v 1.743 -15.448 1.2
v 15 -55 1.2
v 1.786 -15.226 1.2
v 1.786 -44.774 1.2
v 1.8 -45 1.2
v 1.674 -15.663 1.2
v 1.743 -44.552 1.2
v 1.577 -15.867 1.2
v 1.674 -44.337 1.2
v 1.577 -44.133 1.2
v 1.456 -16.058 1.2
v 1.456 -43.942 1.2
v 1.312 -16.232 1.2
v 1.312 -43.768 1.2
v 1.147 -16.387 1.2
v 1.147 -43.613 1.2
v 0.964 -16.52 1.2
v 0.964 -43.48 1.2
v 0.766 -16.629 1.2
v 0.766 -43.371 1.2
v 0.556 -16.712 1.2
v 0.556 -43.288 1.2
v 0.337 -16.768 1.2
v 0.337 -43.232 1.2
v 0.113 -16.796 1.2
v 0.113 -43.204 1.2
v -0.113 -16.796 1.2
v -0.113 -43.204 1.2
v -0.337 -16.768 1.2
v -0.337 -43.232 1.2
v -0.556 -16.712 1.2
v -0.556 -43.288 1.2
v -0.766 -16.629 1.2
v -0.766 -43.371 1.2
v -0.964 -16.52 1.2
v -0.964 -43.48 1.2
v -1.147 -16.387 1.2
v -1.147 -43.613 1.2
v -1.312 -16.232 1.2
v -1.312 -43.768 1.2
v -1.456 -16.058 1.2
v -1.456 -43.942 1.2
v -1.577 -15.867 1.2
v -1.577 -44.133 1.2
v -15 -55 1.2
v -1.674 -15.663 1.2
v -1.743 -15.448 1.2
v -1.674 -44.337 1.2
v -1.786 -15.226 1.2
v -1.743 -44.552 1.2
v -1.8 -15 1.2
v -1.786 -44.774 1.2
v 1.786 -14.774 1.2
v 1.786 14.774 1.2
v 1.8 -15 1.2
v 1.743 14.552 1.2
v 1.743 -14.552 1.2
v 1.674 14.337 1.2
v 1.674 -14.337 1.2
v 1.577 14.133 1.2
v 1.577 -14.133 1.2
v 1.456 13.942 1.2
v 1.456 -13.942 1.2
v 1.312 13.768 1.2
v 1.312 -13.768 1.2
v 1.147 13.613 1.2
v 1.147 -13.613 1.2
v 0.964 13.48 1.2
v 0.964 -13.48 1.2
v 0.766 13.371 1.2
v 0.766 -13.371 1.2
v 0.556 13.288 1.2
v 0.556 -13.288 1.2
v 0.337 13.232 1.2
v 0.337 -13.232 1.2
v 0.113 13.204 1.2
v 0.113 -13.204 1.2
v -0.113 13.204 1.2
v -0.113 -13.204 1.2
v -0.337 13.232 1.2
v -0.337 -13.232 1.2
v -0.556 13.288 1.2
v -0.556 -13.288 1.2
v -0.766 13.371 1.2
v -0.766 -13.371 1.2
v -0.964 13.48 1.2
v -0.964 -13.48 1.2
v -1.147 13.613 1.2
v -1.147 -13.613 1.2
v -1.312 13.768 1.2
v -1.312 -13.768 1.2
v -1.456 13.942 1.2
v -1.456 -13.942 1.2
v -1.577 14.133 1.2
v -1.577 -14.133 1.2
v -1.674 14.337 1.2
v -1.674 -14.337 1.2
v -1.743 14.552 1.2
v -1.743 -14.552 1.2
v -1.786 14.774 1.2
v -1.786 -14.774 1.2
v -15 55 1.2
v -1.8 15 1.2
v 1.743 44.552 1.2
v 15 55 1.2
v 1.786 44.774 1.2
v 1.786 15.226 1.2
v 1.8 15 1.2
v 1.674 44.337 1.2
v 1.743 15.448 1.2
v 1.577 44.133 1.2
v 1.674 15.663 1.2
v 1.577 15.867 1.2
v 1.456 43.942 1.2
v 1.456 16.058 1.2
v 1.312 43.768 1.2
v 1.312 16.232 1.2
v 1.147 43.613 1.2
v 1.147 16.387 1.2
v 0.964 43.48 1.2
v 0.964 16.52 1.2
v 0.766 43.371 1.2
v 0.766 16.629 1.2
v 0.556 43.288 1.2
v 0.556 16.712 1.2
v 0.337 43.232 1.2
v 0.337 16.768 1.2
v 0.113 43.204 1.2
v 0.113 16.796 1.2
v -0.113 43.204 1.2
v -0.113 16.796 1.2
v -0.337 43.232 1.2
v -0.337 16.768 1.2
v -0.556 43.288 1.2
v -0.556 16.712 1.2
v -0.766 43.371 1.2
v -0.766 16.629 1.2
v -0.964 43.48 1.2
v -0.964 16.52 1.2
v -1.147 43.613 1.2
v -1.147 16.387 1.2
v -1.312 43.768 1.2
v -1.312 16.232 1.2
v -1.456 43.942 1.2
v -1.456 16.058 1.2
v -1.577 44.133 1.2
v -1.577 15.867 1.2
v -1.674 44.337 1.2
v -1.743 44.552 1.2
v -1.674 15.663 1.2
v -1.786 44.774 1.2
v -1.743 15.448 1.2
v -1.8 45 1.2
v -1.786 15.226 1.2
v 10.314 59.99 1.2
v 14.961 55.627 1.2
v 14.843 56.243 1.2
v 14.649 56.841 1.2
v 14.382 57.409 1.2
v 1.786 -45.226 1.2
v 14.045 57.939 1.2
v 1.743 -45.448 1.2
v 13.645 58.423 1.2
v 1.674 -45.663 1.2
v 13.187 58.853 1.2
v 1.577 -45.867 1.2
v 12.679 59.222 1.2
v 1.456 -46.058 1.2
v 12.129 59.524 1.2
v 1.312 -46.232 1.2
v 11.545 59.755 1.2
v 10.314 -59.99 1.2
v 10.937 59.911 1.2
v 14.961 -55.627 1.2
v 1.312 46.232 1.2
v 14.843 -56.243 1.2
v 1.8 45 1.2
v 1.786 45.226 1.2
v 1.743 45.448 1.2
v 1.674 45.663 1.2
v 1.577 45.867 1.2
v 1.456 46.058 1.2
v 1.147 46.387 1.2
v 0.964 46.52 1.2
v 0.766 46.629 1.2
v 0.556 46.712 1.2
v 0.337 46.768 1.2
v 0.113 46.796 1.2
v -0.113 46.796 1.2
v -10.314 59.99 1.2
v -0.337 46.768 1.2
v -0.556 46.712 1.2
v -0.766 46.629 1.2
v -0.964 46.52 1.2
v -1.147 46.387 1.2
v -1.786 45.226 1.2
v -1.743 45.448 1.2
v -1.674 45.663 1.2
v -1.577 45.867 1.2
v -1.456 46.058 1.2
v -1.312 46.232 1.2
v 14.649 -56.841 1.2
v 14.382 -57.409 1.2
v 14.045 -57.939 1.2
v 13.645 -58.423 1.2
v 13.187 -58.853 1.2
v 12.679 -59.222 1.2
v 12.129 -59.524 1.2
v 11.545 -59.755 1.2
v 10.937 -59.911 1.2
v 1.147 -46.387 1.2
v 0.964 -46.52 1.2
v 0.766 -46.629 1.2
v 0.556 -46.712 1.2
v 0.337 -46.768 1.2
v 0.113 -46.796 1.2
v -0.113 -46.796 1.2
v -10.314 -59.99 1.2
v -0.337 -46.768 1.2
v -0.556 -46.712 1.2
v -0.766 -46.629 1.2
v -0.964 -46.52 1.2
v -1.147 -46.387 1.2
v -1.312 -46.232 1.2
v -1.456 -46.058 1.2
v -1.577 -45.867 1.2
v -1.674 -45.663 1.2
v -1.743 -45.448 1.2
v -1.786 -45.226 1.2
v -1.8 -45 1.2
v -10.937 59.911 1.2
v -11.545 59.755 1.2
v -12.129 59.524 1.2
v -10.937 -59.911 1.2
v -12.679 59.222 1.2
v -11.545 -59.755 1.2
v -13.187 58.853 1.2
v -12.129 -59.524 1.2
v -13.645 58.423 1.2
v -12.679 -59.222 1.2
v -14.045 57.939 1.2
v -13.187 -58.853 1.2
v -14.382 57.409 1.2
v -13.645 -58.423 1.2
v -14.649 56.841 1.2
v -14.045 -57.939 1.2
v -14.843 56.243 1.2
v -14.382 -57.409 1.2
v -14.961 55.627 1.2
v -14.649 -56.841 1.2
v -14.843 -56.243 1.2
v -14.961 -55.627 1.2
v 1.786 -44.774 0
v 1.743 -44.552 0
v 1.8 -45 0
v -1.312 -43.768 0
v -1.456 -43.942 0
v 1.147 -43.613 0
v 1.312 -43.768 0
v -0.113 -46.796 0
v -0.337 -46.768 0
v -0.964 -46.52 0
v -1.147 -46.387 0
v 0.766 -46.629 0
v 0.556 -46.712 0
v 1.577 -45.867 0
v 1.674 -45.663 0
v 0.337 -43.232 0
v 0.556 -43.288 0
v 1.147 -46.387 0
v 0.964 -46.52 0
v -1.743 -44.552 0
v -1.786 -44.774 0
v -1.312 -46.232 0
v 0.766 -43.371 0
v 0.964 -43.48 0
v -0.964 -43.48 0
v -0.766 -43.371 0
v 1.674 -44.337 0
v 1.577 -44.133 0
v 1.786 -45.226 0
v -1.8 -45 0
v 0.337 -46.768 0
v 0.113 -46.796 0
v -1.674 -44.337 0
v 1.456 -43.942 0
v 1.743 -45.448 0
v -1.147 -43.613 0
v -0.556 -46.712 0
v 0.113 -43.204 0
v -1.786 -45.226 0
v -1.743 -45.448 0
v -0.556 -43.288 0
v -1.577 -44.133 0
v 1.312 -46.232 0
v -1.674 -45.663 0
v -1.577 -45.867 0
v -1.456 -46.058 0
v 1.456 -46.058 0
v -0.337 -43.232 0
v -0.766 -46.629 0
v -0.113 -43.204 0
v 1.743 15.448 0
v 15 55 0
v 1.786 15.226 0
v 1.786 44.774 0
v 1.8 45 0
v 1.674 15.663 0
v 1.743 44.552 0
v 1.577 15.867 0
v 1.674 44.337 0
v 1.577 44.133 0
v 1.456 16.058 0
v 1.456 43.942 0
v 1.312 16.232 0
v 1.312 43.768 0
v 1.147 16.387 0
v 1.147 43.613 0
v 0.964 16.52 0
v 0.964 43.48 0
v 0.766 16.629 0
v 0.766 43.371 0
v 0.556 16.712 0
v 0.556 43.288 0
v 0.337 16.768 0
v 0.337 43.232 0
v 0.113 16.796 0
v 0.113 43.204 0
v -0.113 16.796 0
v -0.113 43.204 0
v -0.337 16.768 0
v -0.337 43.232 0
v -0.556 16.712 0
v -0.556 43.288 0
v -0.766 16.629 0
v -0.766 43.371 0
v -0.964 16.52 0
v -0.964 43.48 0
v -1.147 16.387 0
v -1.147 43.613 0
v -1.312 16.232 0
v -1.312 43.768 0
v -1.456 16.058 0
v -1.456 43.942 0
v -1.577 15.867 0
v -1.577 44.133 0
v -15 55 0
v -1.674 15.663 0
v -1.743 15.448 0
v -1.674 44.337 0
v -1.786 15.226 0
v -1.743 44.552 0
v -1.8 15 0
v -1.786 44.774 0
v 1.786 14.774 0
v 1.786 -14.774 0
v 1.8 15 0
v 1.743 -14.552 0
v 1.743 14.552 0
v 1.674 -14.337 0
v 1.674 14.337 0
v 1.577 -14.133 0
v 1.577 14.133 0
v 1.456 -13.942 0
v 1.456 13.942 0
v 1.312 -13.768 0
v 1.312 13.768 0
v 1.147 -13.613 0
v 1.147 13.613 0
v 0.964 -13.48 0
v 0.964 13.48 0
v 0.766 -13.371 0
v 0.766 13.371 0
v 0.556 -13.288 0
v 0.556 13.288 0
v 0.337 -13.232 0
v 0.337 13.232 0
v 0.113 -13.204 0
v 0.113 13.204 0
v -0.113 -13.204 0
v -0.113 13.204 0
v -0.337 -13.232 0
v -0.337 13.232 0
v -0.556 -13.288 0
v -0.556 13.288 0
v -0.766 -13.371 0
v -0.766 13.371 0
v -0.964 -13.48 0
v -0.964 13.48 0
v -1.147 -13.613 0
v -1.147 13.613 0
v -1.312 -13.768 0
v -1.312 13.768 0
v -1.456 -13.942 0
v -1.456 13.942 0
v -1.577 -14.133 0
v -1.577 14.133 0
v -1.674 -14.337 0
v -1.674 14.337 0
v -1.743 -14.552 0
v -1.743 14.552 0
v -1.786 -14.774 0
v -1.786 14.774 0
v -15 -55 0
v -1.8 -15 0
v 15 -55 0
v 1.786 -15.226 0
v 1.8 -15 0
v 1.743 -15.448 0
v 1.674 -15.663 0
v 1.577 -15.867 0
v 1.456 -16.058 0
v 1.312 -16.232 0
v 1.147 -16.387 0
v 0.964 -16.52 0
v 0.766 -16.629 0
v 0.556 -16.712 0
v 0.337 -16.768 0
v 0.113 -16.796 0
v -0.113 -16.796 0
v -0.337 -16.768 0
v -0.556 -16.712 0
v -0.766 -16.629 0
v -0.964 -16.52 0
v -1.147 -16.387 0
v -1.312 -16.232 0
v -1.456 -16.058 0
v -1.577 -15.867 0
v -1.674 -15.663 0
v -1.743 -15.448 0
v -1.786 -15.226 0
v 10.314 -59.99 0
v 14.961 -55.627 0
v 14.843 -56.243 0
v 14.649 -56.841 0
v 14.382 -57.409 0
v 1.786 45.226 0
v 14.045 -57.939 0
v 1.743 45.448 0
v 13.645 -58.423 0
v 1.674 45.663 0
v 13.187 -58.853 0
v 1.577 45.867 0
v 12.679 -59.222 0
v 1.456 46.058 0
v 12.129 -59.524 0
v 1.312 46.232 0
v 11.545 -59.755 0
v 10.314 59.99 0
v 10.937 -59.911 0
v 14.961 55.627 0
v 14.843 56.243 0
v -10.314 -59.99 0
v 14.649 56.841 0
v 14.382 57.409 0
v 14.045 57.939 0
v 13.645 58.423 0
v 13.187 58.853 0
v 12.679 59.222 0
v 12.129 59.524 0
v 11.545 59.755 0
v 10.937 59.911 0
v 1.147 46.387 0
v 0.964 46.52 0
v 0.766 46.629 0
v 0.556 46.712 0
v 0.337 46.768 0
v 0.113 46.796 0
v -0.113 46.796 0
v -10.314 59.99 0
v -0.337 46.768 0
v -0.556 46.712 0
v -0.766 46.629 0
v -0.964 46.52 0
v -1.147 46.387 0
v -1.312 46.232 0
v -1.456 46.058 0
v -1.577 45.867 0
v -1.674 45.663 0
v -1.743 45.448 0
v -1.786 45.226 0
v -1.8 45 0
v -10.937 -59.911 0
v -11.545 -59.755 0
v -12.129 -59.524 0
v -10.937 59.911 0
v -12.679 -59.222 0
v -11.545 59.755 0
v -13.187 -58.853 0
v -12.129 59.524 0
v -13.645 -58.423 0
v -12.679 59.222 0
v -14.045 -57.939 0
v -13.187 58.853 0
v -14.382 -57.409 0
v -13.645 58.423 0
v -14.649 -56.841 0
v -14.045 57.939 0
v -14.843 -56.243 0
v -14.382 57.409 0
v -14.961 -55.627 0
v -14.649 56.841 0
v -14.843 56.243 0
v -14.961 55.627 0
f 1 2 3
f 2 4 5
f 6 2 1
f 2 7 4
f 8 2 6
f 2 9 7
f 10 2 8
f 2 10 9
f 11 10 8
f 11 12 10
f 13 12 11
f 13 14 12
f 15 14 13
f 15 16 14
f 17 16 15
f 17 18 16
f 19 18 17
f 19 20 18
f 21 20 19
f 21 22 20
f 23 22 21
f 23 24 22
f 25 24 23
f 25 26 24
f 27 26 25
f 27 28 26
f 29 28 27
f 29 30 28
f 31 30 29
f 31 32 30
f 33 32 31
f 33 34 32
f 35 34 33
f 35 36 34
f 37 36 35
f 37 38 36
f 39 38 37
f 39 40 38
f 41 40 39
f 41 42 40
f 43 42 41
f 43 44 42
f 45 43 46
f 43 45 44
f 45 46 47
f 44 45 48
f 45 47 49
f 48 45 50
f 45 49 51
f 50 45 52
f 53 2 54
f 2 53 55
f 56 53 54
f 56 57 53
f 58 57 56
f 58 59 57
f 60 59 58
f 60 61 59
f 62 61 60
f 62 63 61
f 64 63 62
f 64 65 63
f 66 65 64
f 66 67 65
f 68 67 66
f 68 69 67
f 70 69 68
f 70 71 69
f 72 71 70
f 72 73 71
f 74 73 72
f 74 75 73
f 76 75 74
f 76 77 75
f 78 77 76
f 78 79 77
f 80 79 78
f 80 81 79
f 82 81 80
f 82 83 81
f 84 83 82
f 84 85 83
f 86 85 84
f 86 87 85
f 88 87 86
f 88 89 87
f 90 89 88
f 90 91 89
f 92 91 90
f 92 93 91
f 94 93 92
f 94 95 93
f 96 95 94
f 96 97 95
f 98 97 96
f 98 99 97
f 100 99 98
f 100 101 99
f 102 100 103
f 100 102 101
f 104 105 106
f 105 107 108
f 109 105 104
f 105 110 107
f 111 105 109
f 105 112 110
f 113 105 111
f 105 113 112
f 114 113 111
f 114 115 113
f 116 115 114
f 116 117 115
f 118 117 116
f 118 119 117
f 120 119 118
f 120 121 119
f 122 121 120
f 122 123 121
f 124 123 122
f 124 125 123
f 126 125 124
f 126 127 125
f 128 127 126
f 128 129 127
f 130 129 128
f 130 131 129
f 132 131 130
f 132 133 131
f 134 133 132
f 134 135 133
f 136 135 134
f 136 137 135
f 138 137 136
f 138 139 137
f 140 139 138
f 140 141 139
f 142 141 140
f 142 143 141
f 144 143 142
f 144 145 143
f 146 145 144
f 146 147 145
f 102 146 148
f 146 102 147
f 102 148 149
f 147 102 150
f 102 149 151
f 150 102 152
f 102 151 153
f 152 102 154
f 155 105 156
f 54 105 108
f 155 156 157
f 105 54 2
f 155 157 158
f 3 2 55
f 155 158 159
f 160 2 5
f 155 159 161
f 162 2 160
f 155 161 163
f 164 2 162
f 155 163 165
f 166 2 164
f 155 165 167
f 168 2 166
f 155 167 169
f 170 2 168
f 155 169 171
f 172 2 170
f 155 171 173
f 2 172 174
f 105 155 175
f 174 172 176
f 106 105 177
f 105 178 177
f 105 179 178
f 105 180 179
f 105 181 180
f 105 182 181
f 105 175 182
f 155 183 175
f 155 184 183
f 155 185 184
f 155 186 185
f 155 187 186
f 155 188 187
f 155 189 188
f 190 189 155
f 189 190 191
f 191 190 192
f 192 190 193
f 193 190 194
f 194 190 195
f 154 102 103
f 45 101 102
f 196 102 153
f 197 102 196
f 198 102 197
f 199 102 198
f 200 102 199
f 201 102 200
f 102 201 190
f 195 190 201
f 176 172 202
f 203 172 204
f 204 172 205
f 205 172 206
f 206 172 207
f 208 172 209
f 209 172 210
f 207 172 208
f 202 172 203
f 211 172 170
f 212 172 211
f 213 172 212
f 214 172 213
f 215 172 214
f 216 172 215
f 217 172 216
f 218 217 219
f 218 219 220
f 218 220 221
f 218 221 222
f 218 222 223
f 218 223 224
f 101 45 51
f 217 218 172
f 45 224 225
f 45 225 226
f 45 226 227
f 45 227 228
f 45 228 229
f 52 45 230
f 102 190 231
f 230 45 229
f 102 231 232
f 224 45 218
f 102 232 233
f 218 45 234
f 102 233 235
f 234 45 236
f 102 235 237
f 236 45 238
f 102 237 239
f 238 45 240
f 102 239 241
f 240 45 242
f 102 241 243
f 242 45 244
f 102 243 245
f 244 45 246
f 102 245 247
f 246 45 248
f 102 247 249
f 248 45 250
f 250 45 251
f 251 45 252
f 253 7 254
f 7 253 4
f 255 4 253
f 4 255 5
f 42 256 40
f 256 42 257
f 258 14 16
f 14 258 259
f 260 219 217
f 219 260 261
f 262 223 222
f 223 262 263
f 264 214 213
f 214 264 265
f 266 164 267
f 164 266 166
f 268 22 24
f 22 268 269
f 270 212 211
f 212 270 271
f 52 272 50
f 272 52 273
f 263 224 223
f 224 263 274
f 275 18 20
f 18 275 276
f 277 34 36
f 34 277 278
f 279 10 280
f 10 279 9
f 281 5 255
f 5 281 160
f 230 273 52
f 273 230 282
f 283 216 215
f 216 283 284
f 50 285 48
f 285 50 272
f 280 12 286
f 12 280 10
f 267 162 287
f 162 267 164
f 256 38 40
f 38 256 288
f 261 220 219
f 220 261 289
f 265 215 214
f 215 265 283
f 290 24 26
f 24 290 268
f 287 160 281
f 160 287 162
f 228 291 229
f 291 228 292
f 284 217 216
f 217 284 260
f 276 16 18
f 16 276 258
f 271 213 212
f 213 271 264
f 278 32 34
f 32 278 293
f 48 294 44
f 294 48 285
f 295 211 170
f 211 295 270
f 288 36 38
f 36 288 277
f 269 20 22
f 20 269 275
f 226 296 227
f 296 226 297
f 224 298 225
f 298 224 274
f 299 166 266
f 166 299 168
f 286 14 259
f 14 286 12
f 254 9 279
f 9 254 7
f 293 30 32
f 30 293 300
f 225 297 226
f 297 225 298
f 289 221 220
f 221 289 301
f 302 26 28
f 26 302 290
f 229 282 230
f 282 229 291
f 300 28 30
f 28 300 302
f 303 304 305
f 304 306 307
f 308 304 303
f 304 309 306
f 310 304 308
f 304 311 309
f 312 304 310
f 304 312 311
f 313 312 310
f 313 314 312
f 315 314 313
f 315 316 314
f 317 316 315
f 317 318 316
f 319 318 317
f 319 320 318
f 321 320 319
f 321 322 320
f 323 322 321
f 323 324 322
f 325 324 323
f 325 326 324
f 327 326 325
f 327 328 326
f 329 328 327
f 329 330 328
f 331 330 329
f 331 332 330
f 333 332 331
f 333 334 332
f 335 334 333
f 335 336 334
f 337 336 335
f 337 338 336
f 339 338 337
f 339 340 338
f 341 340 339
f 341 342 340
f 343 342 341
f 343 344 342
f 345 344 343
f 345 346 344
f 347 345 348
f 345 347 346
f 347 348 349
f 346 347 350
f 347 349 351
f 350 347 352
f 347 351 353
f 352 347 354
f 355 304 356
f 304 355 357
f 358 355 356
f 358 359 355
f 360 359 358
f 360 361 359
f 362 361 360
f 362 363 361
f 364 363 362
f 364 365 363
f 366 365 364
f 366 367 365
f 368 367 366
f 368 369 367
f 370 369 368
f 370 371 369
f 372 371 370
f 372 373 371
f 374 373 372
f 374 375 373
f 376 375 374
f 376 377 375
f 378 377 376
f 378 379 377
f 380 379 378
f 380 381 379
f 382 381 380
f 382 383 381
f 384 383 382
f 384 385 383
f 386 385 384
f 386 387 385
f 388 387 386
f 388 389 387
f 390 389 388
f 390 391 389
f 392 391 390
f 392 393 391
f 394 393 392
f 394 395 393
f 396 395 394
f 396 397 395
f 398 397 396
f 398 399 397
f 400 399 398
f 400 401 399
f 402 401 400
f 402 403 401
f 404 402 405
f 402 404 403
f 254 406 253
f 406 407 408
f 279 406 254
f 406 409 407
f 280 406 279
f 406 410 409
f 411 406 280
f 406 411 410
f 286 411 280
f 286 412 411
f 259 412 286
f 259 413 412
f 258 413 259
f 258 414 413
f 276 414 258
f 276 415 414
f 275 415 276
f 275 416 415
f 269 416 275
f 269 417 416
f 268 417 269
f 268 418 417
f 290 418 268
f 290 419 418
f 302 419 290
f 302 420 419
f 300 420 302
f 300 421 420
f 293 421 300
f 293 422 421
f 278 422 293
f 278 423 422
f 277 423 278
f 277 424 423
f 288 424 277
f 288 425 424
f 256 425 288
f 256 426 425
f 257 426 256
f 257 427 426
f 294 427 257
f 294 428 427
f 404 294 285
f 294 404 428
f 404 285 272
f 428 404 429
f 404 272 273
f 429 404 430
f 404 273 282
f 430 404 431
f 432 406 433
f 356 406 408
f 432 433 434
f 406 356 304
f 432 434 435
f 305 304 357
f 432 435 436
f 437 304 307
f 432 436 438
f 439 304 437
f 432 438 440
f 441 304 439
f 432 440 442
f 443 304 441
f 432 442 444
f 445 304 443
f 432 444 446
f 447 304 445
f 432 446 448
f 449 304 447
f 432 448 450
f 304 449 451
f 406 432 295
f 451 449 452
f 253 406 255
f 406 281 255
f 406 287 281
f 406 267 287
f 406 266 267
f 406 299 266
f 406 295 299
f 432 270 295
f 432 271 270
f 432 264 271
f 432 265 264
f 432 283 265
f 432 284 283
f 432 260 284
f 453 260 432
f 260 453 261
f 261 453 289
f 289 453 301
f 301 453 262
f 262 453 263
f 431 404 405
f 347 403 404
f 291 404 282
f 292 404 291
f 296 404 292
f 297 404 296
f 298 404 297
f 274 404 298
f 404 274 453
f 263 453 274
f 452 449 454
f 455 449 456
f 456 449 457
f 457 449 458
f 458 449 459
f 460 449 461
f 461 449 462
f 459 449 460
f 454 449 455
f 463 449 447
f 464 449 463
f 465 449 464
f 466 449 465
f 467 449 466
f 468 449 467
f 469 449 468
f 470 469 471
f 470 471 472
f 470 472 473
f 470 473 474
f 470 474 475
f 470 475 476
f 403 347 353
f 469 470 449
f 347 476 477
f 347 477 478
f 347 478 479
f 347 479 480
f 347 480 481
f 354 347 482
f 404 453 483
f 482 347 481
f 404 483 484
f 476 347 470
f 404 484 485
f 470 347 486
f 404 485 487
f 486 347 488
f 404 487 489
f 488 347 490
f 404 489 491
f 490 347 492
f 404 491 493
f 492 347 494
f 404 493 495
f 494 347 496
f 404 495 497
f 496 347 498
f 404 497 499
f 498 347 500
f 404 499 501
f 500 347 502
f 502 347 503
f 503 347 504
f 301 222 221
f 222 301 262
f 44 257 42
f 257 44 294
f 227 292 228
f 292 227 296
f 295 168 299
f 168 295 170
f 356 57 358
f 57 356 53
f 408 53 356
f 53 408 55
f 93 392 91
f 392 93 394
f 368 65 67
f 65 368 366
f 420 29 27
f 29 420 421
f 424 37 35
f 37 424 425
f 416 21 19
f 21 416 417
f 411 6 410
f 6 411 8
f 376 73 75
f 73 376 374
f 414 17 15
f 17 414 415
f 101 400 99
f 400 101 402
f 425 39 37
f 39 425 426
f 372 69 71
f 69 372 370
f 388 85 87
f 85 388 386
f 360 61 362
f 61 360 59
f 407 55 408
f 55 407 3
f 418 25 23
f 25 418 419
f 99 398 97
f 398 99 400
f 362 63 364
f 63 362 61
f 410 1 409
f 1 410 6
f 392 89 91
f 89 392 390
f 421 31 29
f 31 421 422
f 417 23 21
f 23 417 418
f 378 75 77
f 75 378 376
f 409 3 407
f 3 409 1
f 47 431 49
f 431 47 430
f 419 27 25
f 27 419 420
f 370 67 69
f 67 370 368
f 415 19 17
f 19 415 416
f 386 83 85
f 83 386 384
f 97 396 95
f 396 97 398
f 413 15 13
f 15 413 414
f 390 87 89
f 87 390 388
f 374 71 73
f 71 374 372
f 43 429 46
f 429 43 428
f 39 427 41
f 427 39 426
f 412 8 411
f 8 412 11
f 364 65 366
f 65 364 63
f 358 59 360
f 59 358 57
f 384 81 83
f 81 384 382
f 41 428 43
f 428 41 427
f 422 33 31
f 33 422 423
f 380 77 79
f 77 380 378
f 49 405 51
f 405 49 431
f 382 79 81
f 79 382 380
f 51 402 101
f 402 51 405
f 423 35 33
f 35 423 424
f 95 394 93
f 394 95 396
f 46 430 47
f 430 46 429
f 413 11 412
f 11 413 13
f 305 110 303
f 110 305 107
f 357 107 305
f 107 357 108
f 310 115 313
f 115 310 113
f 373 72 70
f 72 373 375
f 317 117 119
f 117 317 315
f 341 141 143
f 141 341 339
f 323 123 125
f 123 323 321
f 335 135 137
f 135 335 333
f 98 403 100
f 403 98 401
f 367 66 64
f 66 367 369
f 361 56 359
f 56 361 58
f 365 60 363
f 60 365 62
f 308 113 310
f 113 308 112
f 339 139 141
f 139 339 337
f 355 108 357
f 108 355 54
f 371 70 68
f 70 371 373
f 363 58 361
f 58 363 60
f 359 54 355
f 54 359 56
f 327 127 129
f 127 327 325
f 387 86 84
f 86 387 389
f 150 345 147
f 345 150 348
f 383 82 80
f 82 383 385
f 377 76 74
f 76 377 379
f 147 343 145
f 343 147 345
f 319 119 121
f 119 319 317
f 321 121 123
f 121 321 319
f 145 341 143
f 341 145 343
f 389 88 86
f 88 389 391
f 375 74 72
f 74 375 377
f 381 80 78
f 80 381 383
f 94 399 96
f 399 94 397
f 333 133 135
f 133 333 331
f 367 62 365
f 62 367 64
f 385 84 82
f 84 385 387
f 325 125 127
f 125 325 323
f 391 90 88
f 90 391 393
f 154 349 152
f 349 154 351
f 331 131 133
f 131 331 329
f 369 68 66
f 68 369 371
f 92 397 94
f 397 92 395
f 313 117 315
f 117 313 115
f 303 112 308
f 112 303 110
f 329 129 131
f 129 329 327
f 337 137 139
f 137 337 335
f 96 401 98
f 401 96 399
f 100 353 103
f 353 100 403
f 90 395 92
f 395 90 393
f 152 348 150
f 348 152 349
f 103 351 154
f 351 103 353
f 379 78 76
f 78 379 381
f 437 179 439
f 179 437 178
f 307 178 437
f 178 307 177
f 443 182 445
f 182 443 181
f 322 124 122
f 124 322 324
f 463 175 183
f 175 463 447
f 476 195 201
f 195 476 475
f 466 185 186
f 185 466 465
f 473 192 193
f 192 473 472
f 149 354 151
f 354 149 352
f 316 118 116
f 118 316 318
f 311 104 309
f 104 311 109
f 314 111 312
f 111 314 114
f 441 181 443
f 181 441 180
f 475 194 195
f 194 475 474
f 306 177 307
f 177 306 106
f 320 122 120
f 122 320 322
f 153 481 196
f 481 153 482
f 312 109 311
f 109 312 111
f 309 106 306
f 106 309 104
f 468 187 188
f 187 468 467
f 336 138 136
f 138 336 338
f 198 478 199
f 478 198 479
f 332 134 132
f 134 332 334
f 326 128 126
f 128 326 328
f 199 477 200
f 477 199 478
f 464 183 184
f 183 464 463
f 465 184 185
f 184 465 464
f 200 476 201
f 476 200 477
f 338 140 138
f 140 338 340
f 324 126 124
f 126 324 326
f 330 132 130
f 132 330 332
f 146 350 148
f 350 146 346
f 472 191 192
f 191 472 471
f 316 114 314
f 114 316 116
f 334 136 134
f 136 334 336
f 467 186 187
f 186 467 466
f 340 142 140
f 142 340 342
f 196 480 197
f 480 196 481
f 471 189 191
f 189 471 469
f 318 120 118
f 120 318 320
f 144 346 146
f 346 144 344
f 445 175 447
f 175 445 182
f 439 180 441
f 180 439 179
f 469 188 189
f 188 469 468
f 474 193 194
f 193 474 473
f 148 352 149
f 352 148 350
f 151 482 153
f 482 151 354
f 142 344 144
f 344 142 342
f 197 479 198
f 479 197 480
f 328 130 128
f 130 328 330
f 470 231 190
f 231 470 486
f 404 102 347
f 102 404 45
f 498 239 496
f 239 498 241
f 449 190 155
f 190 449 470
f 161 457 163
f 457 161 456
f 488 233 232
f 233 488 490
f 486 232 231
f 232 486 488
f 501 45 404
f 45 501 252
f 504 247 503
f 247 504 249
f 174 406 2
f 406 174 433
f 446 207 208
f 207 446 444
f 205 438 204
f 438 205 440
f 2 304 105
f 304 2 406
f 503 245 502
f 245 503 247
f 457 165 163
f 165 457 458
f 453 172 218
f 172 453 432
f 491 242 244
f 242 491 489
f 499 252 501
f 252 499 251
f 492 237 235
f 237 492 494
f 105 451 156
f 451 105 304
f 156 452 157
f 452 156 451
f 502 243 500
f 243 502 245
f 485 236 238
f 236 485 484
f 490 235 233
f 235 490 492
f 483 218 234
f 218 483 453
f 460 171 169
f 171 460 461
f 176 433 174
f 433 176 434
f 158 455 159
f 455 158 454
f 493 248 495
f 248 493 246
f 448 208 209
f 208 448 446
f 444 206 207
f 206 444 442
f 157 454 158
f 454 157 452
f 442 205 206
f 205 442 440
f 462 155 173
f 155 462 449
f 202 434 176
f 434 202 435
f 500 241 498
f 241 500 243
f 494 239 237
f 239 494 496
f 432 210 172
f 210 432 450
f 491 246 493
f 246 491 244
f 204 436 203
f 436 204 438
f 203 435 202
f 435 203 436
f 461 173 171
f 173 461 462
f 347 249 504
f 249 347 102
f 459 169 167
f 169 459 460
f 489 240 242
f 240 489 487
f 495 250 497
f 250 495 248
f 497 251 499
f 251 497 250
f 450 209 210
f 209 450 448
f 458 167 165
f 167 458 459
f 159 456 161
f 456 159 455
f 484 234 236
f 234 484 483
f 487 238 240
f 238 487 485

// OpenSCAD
$fn = 50;


difference() {
	union() {
		hull() {
			translate(v = [-10.0000000000, 55.0000000000, 0]) {
				cylinder(h = 30, r = 5);
			}
			translate(v = [10.0000000000, 55.0000000000, 0]) {
				cylinder(h = 30, r = 5);
			}
			translate(v = [-10.0000000000, -55.0000000000, 0]) {
				cylinder(h = 30, r = 5);
			}
			translate(v = [10.0000000000, -55.0000000000, 0]) {
				cylinder(h = 30, r = 5);
			}
		}
	}
	union() {
		translate(v = [0, 0, 1.2000000000]) {
			hull() {
				translate(v = [-10.0000000000, 55.0000000000, 0]) {
					cylinder(h = 28.8000000000, r = 3.8000000000);
				}
				translate(v = [10.0000000000, 55.0000000000, 0]) {
					cylinder(h = 28.8000000000, r = 3.8000000000);
				}
				translate(v = [-10.0000000000, -55.0000000000, 0]) {
					cylinder(h = 28.8000000000, r = 3.8000000000);
				}
				translate(v = [10.0000000000, -55.0000000000, 0]) {
					cylinder(h = 28.8000000000, r = 3.8000000000);
				}
			}
		}
		#translate(v = [0.0000000000, -45.0000000000, 0]) {
			cylinder(h = 1.2000000000, r = 1.8000000000);
		}
		#translate(v = [0.0000000000, -15.0000000000, 0]) {
			cylinder(h = 1.2000000000, r = 1.8000000000);
		}
		#translate(v = [0.0000000000, 15.0000000000, 0]) {
			cylinder(h = 1.2000000000, r = 1.8000000000);
		}
		#translate(v = [0.0000000000, 45.0000000000, 0]) {
			cylinder(h = 1.2000000000, r = 1.8000000000);
		}
		translate(v = [-250.0000000000, -250.0000000000, 1.2000000000]) {
			cube(size = [500, 500, 500]);
		}
		translate(v = [-250.0000000000, -250.0000000000, 1.2000000000]) {
			cube(size = [500, 500, 500]);
		}
		translate(v = [-250.0000000000, -250.0000000000, 1.2000000000]) {
			cube(size = [500, 500, 500]);
		}
	}
}
